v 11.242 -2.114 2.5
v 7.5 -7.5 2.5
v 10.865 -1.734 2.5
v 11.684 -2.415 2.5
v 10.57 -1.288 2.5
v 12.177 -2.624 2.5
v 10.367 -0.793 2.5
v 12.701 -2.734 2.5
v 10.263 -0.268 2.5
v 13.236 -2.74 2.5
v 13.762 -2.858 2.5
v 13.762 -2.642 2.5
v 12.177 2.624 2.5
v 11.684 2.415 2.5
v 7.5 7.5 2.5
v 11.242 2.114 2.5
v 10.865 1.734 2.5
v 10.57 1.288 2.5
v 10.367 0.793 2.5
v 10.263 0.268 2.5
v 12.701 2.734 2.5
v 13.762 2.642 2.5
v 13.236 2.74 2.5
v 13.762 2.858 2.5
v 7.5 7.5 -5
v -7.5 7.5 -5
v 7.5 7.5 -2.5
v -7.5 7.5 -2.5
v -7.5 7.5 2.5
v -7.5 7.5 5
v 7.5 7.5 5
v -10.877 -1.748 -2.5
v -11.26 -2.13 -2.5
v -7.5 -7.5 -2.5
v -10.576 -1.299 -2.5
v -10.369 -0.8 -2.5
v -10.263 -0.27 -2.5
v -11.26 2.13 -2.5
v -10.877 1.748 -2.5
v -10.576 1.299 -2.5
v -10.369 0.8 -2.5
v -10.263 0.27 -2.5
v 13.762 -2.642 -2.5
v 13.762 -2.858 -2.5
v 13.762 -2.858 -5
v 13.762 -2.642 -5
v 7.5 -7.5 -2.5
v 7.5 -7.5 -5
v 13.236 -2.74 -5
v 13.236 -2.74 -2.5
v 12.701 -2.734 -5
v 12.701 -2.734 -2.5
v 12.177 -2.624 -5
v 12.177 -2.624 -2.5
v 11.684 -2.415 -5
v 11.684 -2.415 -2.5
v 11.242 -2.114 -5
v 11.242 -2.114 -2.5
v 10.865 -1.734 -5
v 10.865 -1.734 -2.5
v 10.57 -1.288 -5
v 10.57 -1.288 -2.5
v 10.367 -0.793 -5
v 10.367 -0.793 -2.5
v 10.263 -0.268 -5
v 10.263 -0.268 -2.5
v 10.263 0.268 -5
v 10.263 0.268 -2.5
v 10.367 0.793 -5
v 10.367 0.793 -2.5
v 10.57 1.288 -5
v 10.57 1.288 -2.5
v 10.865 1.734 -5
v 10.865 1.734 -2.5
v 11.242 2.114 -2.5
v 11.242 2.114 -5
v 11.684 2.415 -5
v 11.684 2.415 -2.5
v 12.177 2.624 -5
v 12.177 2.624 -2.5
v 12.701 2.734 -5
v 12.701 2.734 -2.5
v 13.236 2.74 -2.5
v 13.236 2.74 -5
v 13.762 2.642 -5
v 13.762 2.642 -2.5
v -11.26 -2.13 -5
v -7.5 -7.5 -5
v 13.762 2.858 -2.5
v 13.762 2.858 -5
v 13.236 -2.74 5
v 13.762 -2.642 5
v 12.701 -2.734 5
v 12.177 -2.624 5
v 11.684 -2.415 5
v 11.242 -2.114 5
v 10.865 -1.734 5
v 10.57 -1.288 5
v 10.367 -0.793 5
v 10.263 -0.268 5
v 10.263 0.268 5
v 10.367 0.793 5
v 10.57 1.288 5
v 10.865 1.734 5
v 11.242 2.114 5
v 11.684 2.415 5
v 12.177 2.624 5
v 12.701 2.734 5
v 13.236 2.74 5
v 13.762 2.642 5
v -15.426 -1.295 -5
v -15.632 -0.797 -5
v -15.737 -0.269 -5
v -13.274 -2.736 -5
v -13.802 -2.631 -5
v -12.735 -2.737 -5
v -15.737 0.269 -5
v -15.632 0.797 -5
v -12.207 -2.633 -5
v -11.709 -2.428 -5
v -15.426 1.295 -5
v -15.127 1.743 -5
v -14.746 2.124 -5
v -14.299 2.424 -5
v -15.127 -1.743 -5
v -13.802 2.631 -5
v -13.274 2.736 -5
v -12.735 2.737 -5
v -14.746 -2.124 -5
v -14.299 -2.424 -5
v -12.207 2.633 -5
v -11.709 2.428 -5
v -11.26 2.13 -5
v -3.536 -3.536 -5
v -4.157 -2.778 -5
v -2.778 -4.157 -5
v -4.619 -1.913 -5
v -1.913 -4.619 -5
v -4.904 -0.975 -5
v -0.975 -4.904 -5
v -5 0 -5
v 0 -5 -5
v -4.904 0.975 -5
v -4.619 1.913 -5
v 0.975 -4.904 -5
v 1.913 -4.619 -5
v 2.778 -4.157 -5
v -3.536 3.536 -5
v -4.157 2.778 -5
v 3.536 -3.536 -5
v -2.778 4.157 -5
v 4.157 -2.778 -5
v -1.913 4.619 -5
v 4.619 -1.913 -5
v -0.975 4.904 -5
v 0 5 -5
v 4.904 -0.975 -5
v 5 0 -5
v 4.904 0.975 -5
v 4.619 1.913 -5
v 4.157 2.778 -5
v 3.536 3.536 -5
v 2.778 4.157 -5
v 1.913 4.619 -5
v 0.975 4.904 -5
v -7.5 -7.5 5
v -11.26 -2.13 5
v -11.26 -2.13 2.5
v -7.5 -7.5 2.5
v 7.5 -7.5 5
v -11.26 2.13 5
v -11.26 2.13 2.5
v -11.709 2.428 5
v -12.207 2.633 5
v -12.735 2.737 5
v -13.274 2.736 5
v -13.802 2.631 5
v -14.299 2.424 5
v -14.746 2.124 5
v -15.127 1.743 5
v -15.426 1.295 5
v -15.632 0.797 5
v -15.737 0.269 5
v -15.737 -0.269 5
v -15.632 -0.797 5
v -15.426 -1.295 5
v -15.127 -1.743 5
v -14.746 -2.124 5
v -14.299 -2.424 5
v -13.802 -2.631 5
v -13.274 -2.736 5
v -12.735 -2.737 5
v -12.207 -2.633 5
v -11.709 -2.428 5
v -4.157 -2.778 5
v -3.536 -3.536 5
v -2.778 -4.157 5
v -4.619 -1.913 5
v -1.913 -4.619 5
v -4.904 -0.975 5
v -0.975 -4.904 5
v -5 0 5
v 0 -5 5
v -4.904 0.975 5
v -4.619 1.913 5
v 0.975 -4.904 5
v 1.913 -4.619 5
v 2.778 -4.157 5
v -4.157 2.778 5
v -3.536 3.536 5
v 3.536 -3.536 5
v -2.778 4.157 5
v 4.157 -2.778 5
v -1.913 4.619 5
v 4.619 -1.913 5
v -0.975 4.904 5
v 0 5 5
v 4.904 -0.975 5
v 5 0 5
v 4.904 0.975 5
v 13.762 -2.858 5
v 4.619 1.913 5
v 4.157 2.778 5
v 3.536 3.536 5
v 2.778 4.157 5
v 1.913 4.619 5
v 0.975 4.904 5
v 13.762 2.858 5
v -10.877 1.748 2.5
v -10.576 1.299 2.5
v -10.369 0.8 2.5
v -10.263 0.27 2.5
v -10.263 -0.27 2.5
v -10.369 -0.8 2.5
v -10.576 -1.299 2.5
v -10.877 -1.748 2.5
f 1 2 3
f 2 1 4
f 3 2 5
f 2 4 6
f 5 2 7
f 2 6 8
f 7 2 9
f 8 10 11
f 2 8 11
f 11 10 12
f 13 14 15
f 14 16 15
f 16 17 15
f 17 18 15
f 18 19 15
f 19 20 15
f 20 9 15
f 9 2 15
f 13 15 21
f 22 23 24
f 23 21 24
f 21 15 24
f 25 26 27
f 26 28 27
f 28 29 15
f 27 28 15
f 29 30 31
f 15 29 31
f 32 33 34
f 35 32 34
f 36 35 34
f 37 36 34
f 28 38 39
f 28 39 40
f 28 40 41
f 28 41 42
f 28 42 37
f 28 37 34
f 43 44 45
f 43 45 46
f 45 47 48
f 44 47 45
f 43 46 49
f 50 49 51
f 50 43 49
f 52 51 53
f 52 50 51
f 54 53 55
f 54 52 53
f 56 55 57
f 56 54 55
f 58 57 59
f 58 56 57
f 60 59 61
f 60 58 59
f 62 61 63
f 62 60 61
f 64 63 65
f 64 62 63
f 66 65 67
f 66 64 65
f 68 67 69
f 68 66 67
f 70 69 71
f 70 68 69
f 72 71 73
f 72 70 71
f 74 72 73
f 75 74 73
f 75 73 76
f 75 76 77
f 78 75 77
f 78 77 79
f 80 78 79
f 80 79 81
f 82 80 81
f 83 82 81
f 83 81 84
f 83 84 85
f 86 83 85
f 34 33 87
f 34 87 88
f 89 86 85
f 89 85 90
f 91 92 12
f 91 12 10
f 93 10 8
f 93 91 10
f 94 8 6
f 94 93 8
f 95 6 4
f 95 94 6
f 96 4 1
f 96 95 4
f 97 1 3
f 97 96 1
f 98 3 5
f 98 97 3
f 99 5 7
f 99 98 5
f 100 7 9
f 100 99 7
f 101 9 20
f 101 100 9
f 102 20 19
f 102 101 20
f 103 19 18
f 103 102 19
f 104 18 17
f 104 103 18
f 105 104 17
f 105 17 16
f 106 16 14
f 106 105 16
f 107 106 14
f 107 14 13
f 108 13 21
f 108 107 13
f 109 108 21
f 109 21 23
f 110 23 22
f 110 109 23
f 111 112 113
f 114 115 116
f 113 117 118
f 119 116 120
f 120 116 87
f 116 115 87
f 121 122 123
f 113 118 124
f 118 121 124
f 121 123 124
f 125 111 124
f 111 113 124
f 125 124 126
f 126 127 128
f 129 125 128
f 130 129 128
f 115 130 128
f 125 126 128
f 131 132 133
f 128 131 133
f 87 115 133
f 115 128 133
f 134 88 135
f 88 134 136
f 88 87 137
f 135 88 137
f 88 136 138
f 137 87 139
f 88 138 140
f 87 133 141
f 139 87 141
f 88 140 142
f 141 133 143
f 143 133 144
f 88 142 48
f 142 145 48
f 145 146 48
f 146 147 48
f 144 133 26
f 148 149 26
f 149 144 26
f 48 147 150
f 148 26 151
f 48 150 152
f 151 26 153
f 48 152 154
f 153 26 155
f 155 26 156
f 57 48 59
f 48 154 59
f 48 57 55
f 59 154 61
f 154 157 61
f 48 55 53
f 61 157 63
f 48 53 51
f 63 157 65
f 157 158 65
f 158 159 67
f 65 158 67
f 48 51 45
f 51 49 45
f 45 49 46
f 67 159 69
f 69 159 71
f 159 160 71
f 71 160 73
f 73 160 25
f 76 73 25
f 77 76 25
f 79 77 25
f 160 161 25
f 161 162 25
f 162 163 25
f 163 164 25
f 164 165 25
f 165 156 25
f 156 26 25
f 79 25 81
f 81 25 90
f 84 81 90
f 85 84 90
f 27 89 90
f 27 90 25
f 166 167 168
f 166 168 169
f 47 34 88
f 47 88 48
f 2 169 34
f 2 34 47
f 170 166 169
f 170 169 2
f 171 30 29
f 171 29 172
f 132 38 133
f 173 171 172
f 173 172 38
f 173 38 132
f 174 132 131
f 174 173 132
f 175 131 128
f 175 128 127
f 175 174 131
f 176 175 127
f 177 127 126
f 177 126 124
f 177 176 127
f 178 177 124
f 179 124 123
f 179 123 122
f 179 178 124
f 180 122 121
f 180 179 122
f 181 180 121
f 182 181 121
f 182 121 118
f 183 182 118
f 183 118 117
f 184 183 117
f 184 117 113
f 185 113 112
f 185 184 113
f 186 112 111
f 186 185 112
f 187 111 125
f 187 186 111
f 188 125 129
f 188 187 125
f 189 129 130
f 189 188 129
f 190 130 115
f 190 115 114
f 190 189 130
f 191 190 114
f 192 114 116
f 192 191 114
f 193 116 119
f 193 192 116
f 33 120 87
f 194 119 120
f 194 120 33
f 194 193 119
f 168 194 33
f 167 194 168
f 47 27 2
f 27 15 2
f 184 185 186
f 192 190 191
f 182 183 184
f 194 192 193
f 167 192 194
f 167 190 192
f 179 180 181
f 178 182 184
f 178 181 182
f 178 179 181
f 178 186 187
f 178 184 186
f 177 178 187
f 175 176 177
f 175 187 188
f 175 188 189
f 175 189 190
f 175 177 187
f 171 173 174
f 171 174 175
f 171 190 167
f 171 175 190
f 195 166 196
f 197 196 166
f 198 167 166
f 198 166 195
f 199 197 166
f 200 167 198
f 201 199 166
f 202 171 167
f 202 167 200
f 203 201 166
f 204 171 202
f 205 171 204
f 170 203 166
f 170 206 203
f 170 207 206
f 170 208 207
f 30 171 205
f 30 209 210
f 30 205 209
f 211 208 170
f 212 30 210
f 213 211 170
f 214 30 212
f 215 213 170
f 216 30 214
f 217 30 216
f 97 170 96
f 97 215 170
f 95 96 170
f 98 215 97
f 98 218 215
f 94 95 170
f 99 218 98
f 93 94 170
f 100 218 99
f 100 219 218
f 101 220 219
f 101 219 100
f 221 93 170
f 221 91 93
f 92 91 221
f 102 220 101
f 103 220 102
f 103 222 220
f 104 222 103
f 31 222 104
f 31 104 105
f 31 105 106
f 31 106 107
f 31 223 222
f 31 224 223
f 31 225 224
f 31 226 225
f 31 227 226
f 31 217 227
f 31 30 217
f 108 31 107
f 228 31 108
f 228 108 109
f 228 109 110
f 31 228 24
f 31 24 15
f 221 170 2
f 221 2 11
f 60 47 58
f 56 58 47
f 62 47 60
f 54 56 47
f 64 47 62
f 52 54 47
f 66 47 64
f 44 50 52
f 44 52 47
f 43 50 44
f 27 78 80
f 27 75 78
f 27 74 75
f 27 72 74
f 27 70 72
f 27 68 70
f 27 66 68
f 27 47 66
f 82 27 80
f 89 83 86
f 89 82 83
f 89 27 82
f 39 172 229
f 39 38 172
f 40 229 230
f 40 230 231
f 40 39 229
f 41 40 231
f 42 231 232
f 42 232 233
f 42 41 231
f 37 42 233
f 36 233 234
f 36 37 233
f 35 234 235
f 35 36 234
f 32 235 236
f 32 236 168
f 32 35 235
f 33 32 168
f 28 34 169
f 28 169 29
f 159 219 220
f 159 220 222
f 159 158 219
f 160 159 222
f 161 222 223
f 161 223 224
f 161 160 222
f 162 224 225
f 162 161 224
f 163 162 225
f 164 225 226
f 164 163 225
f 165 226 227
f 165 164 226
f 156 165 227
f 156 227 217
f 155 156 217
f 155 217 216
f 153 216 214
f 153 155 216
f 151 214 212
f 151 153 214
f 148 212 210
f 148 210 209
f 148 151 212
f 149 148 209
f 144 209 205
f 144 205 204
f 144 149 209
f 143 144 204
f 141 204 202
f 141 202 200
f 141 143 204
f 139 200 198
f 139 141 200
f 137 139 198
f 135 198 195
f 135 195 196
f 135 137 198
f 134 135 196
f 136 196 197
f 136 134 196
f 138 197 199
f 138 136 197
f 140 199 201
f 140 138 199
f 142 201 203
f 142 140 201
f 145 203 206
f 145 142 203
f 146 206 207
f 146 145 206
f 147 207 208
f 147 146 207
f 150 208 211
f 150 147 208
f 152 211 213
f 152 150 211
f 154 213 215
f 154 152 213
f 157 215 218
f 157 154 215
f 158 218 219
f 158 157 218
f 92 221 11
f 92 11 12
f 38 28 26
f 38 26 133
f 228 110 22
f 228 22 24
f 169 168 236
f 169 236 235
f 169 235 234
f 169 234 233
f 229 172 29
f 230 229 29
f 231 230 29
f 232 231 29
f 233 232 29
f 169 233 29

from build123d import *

# Parameters (mm, degrees)
F0_W     = 15
F0_H     = 15
F0_R     = 5
F1_DEPTH = 5
F3_DEPTH = 5
F5_DEPTH = 5
F7_DEPTH = 2.5


with BuildPart() as f1:
    # F0 (on Top) → F1 (new body, symmetric)
    with BuildSketch(Plane.XY):
        Rectangle(F0_W, F0_H)
        Circle(F0_R, mode=Mode.SUBTRACT)
    extrude(amount=F1_DEPTH, both=True)

    # F2 (on Top) → F3 (join, symmetric)
    with BuildSketch(Plane.XY):
        with BuildLine():
            Line((13.7621368783, 2.8581836929), (7.5, 7.5))
            Line((7.5, 7.5), (7.5, -7.5))
            Line((7.5, -7.5), (13.7621368783, -2.8581836929))
            Line((13.7621368783, -2.8581836929), (13.7621368783, -2.6422807153))
            ThreePointArc((13.7621368783, -2.6422807153), (10.25, 0), (13.7621368783, 2.6422807153))
            Line((13.7621368783, 2.6422807153), (13.7621368783, 2.8581836929))
        make_face()
    extrude(amount=F3_DEPTH, both=True)

    # F4 (on Top) → F5 (join, symmetric)
    with BuildSketch(Plane.XY):
        with BuildLine():
            Line((-7.5, 7.5), (-11.2602819583, 2.1297608165))
            ThreePointArc((-11.2602819583, 2.1297608165), (-15.75, 0), (-11.2602819583, -2.1297608165))
            Line((-11.2602819583, -2.1297608165), (-7.5, -7.5))
            Line((-7.5, -7.5), (-7.5, 7.5))
        make_face()
    extrude(amount=F5_DEPTH, both=True)

    # F6 (on Top) → F7 (cut, symmetric)
    with BuildSketch(Plane.XY):
        with BuildLine():
            Line((-7.5, -2.1297608165), (-7.5, 2.1297608165))
            Line((-7.5, 2.1297608165), (-7.5, 7.5))
            Line((-7.5, 7.5), (-11.2602819583, 7.5))
            Line((-11.2602819583, 7.5), (-11.2602819583, 2.1297608165))
            ThreePointArc((-11.2602819583, 2.1297608165), (-10.25, 0), (-11.2602819583, -2.1297608165))
            Line((-11.2602819583, -2.1297608165), (-11.2602819583, -7.5))
            Line((-11.2602819583, -7.5), (-7.5, -7.5))
            Line((-7.5, -7.5), (-7.5, -2.1297608165))
        make_face()
        Polygon((7.5, 7.5), (7.5, 2.8581836929), (7.5, -2.8581836929), (7.5, -7.5), (13.7621368783, -7.5), (13.7621368783, -2.8581836929), (13.7621368783, 2.8581836929), (13.7621368783, 7.5), align=None)
    extrude(amount=F7_DEPTH, both=True, mode=Mode.SUBTRACT)


solid = f1.part
